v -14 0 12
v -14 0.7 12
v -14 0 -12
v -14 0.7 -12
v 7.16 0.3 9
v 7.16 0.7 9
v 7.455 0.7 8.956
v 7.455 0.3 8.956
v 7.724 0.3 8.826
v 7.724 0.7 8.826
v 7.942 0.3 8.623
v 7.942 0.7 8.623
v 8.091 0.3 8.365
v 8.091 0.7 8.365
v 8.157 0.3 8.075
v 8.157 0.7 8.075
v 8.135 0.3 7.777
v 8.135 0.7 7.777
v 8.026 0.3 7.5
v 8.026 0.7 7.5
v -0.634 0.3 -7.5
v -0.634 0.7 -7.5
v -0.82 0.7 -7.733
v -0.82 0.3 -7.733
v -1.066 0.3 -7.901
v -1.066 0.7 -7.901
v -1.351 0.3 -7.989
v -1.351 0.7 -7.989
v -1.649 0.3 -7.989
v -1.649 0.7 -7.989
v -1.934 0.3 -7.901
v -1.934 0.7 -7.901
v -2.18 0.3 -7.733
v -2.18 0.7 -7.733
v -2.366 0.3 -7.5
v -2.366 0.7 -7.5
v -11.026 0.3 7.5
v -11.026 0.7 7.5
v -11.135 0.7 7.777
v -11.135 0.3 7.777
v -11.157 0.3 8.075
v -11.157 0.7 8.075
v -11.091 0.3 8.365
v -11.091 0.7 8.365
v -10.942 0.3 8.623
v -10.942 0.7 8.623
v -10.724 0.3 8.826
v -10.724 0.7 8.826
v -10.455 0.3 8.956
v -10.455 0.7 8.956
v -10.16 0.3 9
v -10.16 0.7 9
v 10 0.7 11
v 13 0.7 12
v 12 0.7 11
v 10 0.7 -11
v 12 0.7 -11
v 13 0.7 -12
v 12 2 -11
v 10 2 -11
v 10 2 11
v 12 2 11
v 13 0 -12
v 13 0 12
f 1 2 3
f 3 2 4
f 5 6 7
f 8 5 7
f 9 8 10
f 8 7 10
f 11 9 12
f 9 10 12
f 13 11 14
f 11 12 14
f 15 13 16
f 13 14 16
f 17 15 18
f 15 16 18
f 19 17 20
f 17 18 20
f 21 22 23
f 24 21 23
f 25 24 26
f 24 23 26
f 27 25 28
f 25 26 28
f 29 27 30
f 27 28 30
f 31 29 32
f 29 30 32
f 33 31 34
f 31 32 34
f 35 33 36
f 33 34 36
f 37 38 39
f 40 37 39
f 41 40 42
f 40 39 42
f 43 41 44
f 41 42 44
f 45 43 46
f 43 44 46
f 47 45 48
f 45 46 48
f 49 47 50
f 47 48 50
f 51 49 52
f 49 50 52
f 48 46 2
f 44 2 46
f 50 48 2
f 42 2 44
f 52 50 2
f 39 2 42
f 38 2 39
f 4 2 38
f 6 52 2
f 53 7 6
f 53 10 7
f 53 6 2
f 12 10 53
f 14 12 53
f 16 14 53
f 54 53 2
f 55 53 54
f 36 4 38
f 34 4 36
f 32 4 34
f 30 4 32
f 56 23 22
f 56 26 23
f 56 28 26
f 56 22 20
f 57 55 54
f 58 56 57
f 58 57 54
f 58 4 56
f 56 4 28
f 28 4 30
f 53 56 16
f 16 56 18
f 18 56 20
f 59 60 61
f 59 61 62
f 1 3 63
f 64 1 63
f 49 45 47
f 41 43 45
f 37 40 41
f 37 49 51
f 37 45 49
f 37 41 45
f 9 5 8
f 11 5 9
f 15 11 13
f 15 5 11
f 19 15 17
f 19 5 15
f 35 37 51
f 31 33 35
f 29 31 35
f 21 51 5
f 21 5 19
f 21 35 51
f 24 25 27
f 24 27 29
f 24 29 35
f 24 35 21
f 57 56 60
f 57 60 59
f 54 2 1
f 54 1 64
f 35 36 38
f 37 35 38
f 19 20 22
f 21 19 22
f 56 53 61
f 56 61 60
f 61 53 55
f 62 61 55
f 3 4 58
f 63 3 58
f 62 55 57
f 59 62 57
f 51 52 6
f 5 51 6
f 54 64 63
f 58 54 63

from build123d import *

# Parameters (mm, degrees)
SKETCH1_W           = 26
SKETCH1_H           = 24
BOSS_EXTRUDE1_DEPTH = 0.7
SKETCH2_W           = 2
SKETCH2_H           = 22
BOSS_EXTRUDE2_DEPTH = 1.3
CUT_EXTRUDE2_DEPTH  = 0.4
SKETCH4_W           = 1
SKETCH4_H           = 24
BOSS_EXTRUDE3_DEPTH = 0.7


with BuildPart() as part:
    # Sketch1 → Boss-Extrude1 (new body)
    with BuildSketch(Plane(origin=(0, 0, 0), x_dir=(1, 0, 0), z_dir=(0, 1, 0))):
        Rectangle(SKETCH1_W, SKETCH1_H)
    extrude(amount=BOSS_EXTRUDE1_DEPTH)

    # Sketch2 → Boss-Extrude2 (add)
    with BuildSketch(Plane(origin=(0, 0.7, 0), x_dir=(1, 0, 0), z_dir=(0, 1, 0))):
        with Locations((11, 0)):
            Rectangle(SKETCH2_W, SKETCH2_H)
    extrude(amount=BOSS_EXTRUDE2_DEPTH)

    # Sketch3 → Cut-Extrude2 (cut)
    with BuildSketch(Plane(origin=(0, 0.7, 0), x_dir=(1, 0, 0), z_dir=(0, 1, 0))):
        with BuildLine():
            Line((-2.366025404, 7.5), (-11.026279442, -7.5))
            ThreePointArc((-11.026279442, -7.5), (-11.026279442, -8.5), (-10.160254038, -9))
            Line((-10.160254038, -9), (7.160254038, -9))
            ThreePointArc((7.160254038, -9), (8.026279442, -8.5), (8.026279442, -7.5))
            Line((8.026279442, -7.5), (-0.633974596, 7.5))
            ThreePointArc((-0.633974596, 7.5), (-1.5, 8), (-2.366025404, 7.5))
        make_face()
    extrude(amount=-CUT_EXTRUDE2_DEPTH, mode=Mode.SUBTRACT)

    # Sketch4 → Boss-Extrude3 (add)
    with BuildSketch(Plane(origin=(0, 0.7, 0), x_dir=(1, 0, 0), z_dir=(0, 1, 0))):
        with Locations((-13.5, 0)):
            Rectangle(SKETCH4_W, SKETCH4_H)
    extrude(amount=-BOSS_EXTRUDE3_DEPTH)


solid = part.part
